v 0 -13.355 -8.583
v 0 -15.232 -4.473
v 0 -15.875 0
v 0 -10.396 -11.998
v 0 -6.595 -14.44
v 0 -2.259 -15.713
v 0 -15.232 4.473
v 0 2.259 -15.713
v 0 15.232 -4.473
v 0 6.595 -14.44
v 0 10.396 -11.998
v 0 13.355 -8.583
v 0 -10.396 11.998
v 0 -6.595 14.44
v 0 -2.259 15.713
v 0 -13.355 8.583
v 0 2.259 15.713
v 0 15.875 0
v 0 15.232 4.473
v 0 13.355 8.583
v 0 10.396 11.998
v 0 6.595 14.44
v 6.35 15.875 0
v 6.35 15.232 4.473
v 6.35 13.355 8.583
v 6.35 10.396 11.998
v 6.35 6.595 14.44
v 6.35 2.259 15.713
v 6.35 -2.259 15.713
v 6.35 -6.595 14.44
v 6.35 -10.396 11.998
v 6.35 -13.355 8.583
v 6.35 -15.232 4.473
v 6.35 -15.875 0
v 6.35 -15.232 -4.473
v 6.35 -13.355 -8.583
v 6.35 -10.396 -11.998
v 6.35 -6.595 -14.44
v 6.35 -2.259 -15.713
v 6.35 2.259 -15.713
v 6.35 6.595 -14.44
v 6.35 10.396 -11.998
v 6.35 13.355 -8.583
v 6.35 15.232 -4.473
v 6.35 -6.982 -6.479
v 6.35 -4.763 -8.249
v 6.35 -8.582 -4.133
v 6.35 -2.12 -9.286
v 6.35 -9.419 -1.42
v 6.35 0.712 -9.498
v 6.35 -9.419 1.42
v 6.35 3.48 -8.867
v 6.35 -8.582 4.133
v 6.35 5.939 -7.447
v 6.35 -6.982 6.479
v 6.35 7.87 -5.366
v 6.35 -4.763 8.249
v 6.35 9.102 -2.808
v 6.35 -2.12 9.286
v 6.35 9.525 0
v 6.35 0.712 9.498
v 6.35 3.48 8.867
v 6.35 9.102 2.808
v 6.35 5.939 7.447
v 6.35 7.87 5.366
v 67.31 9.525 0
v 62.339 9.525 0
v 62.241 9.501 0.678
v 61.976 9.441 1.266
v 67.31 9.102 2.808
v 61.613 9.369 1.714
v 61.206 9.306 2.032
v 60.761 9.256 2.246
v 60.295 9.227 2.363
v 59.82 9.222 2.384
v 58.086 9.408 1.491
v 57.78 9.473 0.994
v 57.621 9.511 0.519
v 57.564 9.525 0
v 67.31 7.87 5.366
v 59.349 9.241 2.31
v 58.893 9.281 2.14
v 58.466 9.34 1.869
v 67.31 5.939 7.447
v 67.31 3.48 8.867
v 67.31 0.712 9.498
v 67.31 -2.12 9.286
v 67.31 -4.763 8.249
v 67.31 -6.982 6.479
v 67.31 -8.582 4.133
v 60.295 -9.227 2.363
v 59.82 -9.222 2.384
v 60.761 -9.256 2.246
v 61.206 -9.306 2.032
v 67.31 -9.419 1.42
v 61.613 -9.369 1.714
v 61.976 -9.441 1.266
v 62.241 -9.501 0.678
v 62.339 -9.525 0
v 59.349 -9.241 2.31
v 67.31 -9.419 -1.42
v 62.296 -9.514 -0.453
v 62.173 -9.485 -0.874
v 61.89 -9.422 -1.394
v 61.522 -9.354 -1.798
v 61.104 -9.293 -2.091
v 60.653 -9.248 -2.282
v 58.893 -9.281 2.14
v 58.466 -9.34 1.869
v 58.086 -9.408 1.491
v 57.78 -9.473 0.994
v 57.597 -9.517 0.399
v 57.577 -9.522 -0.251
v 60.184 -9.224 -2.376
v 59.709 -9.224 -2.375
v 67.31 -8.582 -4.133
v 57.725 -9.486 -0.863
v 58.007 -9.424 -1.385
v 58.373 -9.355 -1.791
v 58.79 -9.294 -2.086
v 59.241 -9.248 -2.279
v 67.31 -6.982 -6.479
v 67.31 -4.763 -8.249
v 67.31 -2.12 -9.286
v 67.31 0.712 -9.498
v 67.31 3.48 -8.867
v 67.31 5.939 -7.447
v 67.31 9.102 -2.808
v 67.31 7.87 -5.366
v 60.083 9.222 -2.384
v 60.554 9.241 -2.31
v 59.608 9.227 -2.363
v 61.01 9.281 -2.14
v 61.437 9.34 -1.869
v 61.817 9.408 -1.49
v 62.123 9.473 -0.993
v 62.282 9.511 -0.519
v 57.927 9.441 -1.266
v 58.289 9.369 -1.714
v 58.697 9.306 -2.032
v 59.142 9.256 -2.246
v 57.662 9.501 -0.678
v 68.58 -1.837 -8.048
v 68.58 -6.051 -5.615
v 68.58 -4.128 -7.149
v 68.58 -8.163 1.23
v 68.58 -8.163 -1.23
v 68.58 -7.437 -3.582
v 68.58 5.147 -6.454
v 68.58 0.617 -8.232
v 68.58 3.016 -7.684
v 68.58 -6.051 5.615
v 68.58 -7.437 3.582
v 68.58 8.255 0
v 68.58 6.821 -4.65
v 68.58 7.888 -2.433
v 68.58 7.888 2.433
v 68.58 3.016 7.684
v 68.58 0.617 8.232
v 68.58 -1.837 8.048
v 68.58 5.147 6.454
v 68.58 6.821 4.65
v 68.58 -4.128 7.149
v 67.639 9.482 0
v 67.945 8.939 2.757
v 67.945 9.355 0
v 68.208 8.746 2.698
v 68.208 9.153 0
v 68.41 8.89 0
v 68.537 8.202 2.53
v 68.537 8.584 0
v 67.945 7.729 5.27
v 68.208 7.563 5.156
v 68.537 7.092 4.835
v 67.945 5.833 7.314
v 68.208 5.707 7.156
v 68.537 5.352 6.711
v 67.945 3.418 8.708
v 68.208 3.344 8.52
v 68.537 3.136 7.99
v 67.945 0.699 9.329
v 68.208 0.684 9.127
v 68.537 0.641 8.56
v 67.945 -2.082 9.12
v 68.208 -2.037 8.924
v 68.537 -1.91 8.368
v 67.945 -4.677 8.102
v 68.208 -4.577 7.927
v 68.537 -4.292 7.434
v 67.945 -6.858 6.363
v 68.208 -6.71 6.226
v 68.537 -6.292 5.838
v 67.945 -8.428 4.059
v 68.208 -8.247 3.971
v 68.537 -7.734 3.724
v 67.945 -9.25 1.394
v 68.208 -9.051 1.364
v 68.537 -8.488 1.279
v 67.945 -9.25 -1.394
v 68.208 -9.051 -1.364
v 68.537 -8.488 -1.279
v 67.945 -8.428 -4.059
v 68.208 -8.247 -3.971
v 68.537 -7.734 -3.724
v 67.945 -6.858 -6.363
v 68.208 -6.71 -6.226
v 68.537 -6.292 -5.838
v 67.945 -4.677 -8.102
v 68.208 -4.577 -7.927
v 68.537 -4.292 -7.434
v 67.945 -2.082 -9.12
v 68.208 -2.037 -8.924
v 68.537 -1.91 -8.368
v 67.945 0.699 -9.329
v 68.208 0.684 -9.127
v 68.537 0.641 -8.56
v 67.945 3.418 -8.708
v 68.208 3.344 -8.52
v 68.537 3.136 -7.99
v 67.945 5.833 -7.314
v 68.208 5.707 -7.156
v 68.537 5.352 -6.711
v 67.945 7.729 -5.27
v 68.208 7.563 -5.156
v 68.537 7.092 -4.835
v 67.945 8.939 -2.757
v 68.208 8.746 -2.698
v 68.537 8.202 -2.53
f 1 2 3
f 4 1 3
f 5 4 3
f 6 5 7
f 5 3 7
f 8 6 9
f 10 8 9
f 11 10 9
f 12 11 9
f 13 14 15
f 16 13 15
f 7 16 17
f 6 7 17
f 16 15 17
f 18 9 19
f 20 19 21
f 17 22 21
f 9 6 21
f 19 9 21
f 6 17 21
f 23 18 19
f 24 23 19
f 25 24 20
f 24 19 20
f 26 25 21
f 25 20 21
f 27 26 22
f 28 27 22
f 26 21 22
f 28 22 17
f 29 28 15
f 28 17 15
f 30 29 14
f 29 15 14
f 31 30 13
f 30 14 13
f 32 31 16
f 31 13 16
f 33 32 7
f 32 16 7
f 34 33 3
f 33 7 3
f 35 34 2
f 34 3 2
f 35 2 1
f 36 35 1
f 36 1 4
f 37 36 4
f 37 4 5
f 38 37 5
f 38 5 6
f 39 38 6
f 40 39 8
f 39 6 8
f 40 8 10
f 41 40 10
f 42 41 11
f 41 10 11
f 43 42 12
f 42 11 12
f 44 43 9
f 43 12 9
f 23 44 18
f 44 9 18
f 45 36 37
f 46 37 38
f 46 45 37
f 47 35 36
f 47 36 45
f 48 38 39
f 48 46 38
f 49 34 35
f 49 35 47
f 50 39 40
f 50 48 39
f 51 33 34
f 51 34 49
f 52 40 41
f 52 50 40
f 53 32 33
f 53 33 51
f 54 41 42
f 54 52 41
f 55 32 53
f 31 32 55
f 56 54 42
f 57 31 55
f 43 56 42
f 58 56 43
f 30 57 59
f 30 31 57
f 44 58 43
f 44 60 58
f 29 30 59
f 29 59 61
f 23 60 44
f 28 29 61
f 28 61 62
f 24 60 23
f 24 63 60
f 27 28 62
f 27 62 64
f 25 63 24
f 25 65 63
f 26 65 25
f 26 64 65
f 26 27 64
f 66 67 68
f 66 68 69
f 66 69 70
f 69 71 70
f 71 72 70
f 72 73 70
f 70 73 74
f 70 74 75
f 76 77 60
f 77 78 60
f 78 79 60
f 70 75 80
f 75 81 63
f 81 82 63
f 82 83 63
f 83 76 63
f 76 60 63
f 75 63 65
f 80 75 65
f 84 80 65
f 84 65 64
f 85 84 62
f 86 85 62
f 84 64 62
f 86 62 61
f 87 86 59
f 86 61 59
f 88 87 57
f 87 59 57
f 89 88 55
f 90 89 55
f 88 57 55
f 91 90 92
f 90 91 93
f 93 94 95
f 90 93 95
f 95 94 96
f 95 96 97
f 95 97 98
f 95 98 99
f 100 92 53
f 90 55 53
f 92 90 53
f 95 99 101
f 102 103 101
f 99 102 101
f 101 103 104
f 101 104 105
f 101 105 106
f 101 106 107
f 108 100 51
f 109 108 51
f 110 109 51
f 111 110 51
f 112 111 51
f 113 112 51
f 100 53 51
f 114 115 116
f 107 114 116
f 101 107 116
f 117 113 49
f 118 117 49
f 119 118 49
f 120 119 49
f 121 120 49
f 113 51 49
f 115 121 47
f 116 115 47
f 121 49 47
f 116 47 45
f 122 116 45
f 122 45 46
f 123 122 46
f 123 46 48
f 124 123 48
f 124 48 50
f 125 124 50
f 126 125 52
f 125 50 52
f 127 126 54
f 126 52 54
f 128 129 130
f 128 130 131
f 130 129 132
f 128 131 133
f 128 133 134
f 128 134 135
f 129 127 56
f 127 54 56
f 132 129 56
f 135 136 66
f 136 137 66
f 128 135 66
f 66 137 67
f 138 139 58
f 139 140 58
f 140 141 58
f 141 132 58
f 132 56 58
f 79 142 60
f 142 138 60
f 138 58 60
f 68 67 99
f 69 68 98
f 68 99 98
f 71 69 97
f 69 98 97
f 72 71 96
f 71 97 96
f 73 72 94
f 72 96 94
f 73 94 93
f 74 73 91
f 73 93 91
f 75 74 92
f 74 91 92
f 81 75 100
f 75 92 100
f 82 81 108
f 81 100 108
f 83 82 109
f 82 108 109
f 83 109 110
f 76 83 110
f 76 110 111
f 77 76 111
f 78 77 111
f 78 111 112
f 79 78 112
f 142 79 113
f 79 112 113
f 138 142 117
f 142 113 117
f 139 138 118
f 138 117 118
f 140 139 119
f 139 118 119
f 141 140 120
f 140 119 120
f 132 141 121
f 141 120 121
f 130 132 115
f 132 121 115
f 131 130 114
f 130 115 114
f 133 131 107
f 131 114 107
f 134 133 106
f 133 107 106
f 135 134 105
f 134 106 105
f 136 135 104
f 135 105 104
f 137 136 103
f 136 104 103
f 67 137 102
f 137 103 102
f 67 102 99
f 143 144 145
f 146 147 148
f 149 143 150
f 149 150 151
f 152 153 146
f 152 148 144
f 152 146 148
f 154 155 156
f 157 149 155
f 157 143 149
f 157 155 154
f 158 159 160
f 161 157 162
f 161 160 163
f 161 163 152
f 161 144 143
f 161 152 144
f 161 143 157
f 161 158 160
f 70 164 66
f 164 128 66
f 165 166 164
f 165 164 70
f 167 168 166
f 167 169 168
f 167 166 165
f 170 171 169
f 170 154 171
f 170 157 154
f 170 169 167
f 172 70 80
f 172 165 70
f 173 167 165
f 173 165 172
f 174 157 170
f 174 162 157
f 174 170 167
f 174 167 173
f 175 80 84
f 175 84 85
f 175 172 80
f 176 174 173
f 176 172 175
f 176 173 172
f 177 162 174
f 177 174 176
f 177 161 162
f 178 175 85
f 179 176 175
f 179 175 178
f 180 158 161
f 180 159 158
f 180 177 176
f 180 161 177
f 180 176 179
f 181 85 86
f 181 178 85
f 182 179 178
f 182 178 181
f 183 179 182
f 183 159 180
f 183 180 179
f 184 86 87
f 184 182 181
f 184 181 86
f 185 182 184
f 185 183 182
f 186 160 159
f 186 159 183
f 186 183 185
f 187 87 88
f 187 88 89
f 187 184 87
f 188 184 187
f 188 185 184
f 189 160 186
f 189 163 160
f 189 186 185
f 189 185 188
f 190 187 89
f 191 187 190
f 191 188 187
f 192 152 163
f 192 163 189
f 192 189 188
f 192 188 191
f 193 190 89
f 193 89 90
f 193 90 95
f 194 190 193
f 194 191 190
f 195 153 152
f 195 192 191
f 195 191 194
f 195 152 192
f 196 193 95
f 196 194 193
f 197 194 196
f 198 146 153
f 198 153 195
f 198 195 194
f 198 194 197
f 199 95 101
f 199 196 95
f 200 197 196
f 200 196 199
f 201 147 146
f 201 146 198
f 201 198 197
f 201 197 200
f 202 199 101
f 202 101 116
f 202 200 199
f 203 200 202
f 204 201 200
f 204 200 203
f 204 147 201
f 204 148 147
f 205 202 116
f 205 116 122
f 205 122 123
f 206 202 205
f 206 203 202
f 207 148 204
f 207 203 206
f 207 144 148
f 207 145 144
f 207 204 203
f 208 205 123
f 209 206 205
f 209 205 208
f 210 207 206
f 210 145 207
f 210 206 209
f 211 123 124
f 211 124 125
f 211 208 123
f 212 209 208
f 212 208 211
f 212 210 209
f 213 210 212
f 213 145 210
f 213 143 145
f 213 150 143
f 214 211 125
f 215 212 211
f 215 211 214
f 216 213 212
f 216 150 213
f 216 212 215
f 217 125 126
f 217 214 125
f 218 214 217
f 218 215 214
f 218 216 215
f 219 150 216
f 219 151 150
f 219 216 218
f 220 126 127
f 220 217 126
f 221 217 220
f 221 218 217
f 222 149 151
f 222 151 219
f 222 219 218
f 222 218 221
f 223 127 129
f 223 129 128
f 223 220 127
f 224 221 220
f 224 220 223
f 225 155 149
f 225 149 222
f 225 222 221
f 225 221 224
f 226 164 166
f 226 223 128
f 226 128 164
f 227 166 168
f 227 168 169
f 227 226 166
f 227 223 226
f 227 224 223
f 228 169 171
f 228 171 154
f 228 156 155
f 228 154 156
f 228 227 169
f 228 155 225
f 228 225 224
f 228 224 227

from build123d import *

# Parameters (mm, degrees)
F0_R     = 15.875
F1_DEPTH = 6.35
F2_R     = 9.525
F3_DEPTH = 62.23
F4_R     = 1.27
F5_R     = 2.3876
F6_DEPTH = 12.7


with BuildPart() as f1:
    # F0 (on Right) → F1 (new body)
    with BuildSketch(Plane.YZ):
        Circle(F0_R)
    extrude(amount=F1_DEPTH)

    # F2 (on face) → F3 (join)
    with BuildSketch(Plane.YZ.offset(6.35)):
        Circle(F2_R)
    extrude(amount=F3_DEPTH)

    # F4
    f4_edges = [f1.edges().sort_by_distance(p)[0] for p in [
        (68.58, -9.525, 0),
    ]]
    fillet(f4_edges, radius=F4_R)

    # F5 (on Front) → F6 (cut, symmetric)
    with BuildSketch(Plane.XZ):
        with Locations((59.951451, 0)):
            Circle(F5_R)
    extrude(amount=F6_DEPTH, both=True, mode=Mode.SUBTRACT)


solid = f1.part
